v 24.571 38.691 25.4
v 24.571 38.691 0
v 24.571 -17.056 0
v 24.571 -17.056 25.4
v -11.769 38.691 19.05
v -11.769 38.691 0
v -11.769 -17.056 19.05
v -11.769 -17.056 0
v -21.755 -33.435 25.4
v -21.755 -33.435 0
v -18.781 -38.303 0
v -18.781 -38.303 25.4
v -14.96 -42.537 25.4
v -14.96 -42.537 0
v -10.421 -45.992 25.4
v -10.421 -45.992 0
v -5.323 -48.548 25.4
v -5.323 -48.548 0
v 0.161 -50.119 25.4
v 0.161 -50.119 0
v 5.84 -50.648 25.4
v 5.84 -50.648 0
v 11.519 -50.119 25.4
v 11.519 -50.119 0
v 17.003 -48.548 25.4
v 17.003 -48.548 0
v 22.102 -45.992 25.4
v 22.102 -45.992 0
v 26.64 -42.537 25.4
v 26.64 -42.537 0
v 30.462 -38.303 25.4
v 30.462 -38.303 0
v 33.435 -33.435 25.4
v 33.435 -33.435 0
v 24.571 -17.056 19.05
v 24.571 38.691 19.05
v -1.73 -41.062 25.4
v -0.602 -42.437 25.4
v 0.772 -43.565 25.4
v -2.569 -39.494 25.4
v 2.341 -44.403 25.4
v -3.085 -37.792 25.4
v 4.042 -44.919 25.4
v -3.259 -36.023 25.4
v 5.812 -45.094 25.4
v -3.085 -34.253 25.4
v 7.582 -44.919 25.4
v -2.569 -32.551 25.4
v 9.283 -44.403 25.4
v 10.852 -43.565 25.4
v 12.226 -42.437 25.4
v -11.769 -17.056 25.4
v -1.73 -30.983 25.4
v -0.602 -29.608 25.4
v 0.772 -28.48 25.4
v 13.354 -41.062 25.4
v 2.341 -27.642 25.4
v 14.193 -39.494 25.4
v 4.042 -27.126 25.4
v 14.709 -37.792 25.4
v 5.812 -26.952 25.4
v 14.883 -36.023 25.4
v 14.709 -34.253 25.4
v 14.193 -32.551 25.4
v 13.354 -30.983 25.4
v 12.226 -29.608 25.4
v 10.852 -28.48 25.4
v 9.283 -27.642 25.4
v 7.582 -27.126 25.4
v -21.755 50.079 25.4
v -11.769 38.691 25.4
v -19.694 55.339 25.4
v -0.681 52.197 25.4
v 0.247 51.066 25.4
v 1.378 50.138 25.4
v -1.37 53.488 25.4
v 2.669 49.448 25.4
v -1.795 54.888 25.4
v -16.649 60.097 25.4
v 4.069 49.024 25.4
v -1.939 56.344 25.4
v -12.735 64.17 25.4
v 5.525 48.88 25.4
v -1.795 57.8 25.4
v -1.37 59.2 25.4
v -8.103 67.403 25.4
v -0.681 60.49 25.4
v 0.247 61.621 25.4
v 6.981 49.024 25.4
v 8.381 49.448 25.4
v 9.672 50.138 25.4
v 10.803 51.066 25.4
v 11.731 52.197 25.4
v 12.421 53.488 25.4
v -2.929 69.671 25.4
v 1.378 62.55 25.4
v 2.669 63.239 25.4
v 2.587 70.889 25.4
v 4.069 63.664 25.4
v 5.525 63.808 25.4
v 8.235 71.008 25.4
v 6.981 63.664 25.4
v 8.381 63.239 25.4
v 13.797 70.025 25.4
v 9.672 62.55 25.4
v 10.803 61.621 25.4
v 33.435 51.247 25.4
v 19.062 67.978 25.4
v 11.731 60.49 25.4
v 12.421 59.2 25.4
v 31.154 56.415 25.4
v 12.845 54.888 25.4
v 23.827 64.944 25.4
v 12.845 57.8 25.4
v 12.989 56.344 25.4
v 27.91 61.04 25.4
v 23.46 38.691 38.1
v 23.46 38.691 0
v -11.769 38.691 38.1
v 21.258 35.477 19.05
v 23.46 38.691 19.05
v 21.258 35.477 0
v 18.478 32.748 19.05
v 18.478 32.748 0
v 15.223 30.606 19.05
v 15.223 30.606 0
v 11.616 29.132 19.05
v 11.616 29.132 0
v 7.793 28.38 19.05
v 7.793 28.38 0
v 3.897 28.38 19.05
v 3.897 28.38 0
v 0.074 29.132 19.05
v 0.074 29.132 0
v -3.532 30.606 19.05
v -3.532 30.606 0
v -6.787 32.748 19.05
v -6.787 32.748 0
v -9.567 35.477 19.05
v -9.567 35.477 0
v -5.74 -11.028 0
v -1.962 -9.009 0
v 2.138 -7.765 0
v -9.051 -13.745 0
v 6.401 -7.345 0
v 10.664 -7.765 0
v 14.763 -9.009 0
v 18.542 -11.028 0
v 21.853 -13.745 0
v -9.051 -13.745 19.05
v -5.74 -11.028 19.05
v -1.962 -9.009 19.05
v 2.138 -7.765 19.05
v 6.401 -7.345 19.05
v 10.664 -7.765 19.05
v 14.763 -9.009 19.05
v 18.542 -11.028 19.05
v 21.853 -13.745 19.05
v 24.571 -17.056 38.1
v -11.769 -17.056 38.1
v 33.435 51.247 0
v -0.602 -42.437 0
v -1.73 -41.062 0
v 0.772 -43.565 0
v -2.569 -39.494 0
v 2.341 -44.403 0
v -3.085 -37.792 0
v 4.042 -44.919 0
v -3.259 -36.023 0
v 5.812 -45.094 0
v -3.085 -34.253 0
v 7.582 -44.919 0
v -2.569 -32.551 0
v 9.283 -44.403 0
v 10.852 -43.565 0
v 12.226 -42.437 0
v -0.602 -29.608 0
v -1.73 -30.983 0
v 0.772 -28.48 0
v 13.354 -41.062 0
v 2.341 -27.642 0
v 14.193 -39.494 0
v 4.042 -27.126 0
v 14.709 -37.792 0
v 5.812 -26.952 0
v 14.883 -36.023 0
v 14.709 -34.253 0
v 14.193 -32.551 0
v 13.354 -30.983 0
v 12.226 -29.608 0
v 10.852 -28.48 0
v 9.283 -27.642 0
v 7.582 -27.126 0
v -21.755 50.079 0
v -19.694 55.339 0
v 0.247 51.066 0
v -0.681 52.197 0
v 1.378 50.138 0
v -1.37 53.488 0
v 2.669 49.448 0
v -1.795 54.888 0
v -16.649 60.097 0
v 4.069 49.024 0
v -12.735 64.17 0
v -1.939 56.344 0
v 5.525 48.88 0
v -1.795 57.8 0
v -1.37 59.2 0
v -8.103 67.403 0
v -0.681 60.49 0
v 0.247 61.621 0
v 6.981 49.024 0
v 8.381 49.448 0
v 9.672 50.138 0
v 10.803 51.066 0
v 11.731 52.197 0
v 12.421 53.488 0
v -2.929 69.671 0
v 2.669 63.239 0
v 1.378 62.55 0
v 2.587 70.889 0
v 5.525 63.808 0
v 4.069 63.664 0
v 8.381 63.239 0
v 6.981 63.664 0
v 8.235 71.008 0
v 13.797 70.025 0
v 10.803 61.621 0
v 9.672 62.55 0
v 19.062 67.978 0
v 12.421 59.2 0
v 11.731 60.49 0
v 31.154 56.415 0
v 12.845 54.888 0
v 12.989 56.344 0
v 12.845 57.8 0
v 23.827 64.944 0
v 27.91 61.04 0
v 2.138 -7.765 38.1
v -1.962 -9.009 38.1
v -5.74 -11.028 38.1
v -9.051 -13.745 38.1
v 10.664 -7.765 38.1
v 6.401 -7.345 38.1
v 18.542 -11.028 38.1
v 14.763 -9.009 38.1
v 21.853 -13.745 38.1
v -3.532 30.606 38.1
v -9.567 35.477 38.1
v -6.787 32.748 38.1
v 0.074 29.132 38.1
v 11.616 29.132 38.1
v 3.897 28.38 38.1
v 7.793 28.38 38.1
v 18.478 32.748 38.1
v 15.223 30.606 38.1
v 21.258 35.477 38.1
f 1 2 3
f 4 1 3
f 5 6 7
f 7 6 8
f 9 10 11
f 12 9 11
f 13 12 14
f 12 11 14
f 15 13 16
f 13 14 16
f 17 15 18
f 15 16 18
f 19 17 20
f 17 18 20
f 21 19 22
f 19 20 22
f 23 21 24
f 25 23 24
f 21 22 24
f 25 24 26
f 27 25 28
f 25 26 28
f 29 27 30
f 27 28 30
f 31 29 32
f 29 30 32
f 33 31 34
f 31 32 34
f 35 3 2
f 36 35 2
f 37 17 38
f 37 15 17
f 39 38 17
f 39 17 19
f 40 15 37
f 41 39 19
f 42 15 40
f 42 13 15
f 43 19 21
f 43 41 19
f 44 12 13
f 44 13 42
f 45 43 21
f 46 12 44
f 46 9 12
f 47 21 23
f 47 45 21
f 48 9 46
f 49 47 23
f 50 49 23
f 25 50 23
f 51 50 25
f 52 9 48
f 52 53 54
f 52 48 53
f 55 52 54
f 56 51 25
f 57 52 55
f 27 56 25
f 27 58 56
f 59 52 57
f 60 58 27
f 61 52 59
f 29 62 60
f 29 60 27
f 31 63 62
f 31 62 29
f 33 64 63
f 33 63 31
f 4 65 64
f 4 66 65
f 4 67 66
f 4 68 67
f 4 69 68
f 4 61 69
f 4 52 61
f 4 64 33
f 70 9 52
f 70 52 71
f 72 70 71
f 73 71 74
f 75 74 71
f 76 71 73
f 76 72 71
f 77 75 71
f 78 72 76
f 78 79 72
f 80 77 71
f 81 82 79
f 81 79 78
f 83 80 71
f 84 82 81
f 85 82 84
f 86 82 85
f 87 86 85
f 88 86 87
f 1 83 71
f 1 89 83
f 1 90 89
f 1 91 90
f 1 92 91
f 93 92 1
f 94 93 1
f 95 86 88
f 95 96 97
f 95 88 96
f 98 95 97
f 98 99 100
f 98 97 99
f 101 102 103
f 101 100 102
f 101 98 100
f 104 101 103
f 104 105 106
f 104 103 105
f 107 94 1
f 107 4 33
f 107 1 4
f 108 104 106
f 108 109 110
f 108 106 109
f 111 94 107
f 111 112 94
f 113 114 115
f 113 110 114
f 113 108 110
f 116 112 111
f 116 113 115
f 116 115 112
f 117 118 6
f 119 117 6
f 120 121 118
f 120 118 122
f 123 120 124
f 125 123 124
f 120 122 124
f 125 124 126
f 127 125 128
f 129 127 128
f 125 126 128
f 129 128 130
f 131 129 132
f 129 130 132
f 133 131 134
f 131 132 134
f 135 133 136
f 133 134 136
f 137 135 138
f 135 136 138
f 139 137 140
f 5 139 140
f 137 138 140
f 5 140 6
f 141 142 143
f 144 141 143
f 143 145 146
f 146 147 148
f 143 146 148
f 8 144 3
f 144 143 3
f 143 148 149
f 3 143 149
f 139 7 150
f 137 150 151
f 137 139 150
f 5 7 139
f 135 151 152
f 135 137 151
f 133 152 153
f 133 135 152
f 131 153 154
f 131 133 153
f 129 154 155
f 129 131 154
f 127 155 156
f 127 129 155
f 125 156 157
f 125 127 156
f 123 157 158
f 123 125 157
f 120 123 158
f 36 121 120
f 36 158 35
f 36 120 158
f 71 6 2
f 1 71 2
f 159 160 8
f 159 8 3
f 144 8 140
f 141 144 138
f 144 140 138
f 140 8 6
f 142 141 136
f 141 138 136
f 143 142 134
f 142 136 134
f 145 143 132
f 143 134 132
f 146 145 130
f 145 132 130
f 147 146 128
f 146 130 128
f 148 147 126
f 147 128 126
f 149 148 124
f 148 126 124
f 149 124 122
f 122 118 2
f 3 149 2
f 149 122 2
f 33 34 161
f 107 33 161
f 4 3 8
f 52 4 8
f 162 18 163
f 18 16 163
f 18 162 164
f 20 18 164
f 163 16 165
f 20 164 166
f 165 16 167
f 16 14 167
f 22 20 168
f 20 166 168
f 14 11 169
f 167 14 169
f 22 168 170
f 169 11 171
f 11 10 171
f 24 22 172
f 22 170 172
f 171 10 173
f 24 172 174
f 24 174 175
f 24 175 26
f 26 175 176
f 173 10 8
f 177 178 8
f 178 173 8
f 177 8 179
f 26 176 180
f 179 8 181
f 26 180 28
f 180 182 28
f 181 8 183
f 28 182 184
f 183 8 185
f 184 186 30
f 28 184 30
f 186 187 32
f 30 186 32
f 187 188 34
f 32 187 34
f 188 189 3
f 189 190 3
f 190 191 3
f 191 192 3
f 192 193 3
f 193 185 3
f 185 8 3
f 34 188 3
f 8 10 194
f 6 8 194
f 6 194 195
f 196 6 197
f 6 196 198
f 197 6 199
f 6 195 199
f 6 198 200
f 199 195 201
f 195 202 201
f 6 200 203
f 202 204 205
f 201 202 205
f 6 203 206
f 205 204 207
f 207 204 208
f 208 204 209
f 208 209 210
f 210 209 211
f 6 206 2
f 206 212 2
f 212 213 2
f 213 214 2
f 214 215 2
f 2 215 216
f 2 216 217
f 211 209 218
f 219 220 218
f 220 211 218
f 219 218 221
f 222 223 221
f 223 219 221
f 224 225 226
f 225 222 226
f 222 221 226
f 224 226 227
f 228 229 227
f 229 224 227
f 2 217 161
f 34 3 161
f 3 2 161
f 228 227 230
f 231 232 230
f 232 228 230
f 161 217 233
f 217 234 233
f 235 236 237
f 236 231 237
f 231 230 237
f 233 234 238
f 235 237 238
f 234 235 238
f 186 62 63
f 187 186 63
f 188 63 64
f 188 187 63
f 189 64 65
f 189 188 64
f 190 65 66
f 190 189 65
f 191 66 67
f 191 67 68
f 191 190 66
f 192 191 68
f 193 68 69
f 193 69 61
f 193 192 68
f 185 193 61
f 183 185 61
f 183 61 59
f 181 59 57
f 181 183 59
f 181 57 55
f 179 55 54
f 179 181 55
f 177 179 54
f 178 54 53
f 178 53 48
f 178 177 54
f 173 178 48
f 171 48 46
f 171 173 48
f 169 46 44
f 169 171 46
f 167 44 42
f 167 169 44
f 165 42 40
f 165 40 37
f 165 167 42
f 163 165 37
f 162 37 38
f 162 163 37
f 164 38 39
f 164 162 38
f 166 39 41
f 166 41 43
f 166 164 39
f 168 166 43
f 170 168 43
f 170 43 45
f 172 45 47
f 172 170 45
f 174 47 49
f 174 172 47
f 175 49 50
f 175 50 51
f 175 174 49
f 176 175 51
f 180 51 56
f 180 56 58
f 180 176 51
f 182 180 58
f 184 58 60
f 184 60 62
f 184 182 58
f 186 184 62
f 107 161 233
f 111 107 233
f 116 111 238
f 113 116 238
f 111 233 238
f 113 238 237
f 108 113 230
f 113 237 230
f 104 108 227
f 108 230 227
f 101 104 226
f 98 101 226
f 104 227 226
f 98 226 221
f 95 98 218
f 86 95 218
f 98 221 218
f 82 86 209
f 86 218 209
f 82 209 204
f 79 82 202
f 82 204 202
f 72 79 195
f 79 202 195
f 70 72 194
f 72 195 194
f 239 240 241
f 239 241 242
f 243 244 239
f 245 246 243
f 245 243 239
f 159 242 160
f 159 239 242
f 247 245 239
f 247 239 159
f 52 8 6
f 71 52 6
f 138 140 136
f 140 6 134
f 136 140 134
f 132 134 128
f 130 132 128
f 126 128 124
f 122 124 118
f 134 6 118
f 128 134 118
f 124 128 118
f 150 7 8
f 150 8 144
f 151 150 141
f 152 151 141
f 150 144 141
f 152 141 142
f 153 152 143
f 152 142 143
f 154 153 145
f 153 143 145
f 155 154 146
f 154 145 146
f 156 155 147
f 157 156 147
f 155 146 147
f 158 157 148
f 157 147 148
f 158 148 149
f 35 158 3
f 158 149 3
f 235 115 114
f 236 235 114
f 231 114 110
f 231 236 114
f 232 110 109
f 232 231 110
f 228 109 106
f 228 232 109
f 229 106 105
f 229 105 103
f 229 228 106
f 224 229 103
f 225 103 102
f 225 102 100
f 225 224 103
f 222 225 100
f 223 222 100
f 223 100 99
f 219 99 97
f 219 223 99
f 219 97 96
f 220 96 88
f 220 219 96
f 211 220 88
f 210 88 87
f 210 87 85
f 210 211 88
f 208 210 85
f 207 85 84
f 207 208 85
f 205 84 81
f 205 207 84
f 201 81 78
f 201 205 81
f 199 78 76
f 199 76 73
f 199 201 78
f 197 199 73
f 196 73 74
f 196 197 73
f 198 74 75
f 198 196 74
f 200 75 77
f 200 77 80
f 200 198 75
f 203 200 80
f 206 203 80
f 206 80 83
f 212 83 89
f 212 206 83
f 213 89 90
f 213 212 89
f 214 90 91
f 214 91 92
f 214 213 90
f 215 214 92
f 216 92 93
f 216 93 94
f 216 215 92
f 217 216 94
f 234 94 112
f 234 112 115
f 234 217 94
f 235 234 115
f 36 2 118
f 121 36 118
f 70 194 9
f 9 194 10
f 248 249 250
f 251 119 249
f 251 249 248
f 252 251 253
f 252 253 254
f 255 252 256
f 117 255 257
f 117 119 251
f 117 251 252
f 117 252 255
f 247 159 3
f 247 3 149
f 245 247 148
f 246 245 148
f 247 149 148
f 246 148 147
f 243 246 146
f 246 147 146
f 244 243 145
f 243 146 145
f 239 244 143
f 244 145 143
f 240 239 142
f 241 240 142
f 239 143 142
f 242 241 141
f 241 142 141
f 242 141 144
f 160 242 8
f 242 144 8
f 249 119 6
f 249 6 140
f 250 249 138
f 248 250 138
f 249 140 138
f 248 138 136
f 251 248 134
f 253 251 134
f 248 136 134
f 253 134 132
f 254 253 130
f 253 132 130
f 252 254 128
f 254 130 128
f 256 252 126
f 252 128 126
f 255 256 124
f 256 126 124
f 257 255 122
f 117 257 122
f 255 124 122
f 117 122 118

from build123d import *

# Parameters (mm, degrees)
F1_DEPTH = 38.1
F0_R     = 9.071079
F0_R_2   = 7.463682
F2_DEPTH = 25.4
F3_DEPTH = 19.05


with BuildPart() as f1:
    # F0 (on Top) → F1 (new body)
    with BuildSketch(Plane.XY):
        with BuildLine():
            Line((23.460182, 38.690966), (-11.769377, 38.690966))
            ThreePointArc((-11.769377, 38.690966), (5.845403, 28.285846), (23.460182, 38.690966))
        make_face()
        with BuildLine():
            ThreePointArc((24.571158, -17.05615), (6.400891, -7.345424), (-11.769377, -17.05615))
            Line((-11.769377, -17.05615), (24.571158, -17.05615))
        make_face()
    extrude(amount=F1_DEPTH)


with BuildPart() as f2:
    # F0 (on Top) → F2 (new body)
    with BuildSketch(Plane.XY):
        with BuildLine():
            Line((33.434838, -33.434838), (33.434838, 51.247284))
            ThreePointArc((33.434838, 51.247284), (5.407896, 71.087097), (-21.754544, 50.079253))
            Line((-21.754544, 50.079253), (-21.754544, -33.434838))
            ThreePointArc((-21.754544, -33.434838), (5.840147, -50.647943), (33.434838, -33.434838))
        make_face()
        with Locations((5.811937, -36.022719)):
            Circle(F0_R, mode=Mode.SUBTRACT)
        with Locations((5.525085, 56.343842)):
            Circle(F0_R_2, mode=Mode.SUBTRACT)
        Polygon((-11.769377, -17.05615), (-11.769377, 38.690966), (23.460182, 38.690966), (24.571158, 38.690966), (24.571158, -17.05615), align=None, mode=Mode.SUBTRACT)
    extrude(amount=F2_DEPTH)


with BuildPart() as f3:
    # F0 (on Top) → F3 (new body)
    with BuildSketch(Plane.XY):
        with BuildLine():
            ThreePointArc((23.460182, 38.690966), (5.845403, 28.285846), (-11.769377, 38.690966))
            Line((-11.769377, 38.690966), (-11.769377, -17.05615))
            ThreePointArc((-11.769377, -17.05615), (6.400891, -7.345424), (24.571158, -17.05615))
            Line((24.571158, -17.05615), (24.571158, 38.690966))
            Line((24.571158, 38.690966), (23.460182, 38.690966))
        make_face()
    extrude(amount=F3_DEPTH)


solid = Compound([f1.part, f2.part, f3.part])
